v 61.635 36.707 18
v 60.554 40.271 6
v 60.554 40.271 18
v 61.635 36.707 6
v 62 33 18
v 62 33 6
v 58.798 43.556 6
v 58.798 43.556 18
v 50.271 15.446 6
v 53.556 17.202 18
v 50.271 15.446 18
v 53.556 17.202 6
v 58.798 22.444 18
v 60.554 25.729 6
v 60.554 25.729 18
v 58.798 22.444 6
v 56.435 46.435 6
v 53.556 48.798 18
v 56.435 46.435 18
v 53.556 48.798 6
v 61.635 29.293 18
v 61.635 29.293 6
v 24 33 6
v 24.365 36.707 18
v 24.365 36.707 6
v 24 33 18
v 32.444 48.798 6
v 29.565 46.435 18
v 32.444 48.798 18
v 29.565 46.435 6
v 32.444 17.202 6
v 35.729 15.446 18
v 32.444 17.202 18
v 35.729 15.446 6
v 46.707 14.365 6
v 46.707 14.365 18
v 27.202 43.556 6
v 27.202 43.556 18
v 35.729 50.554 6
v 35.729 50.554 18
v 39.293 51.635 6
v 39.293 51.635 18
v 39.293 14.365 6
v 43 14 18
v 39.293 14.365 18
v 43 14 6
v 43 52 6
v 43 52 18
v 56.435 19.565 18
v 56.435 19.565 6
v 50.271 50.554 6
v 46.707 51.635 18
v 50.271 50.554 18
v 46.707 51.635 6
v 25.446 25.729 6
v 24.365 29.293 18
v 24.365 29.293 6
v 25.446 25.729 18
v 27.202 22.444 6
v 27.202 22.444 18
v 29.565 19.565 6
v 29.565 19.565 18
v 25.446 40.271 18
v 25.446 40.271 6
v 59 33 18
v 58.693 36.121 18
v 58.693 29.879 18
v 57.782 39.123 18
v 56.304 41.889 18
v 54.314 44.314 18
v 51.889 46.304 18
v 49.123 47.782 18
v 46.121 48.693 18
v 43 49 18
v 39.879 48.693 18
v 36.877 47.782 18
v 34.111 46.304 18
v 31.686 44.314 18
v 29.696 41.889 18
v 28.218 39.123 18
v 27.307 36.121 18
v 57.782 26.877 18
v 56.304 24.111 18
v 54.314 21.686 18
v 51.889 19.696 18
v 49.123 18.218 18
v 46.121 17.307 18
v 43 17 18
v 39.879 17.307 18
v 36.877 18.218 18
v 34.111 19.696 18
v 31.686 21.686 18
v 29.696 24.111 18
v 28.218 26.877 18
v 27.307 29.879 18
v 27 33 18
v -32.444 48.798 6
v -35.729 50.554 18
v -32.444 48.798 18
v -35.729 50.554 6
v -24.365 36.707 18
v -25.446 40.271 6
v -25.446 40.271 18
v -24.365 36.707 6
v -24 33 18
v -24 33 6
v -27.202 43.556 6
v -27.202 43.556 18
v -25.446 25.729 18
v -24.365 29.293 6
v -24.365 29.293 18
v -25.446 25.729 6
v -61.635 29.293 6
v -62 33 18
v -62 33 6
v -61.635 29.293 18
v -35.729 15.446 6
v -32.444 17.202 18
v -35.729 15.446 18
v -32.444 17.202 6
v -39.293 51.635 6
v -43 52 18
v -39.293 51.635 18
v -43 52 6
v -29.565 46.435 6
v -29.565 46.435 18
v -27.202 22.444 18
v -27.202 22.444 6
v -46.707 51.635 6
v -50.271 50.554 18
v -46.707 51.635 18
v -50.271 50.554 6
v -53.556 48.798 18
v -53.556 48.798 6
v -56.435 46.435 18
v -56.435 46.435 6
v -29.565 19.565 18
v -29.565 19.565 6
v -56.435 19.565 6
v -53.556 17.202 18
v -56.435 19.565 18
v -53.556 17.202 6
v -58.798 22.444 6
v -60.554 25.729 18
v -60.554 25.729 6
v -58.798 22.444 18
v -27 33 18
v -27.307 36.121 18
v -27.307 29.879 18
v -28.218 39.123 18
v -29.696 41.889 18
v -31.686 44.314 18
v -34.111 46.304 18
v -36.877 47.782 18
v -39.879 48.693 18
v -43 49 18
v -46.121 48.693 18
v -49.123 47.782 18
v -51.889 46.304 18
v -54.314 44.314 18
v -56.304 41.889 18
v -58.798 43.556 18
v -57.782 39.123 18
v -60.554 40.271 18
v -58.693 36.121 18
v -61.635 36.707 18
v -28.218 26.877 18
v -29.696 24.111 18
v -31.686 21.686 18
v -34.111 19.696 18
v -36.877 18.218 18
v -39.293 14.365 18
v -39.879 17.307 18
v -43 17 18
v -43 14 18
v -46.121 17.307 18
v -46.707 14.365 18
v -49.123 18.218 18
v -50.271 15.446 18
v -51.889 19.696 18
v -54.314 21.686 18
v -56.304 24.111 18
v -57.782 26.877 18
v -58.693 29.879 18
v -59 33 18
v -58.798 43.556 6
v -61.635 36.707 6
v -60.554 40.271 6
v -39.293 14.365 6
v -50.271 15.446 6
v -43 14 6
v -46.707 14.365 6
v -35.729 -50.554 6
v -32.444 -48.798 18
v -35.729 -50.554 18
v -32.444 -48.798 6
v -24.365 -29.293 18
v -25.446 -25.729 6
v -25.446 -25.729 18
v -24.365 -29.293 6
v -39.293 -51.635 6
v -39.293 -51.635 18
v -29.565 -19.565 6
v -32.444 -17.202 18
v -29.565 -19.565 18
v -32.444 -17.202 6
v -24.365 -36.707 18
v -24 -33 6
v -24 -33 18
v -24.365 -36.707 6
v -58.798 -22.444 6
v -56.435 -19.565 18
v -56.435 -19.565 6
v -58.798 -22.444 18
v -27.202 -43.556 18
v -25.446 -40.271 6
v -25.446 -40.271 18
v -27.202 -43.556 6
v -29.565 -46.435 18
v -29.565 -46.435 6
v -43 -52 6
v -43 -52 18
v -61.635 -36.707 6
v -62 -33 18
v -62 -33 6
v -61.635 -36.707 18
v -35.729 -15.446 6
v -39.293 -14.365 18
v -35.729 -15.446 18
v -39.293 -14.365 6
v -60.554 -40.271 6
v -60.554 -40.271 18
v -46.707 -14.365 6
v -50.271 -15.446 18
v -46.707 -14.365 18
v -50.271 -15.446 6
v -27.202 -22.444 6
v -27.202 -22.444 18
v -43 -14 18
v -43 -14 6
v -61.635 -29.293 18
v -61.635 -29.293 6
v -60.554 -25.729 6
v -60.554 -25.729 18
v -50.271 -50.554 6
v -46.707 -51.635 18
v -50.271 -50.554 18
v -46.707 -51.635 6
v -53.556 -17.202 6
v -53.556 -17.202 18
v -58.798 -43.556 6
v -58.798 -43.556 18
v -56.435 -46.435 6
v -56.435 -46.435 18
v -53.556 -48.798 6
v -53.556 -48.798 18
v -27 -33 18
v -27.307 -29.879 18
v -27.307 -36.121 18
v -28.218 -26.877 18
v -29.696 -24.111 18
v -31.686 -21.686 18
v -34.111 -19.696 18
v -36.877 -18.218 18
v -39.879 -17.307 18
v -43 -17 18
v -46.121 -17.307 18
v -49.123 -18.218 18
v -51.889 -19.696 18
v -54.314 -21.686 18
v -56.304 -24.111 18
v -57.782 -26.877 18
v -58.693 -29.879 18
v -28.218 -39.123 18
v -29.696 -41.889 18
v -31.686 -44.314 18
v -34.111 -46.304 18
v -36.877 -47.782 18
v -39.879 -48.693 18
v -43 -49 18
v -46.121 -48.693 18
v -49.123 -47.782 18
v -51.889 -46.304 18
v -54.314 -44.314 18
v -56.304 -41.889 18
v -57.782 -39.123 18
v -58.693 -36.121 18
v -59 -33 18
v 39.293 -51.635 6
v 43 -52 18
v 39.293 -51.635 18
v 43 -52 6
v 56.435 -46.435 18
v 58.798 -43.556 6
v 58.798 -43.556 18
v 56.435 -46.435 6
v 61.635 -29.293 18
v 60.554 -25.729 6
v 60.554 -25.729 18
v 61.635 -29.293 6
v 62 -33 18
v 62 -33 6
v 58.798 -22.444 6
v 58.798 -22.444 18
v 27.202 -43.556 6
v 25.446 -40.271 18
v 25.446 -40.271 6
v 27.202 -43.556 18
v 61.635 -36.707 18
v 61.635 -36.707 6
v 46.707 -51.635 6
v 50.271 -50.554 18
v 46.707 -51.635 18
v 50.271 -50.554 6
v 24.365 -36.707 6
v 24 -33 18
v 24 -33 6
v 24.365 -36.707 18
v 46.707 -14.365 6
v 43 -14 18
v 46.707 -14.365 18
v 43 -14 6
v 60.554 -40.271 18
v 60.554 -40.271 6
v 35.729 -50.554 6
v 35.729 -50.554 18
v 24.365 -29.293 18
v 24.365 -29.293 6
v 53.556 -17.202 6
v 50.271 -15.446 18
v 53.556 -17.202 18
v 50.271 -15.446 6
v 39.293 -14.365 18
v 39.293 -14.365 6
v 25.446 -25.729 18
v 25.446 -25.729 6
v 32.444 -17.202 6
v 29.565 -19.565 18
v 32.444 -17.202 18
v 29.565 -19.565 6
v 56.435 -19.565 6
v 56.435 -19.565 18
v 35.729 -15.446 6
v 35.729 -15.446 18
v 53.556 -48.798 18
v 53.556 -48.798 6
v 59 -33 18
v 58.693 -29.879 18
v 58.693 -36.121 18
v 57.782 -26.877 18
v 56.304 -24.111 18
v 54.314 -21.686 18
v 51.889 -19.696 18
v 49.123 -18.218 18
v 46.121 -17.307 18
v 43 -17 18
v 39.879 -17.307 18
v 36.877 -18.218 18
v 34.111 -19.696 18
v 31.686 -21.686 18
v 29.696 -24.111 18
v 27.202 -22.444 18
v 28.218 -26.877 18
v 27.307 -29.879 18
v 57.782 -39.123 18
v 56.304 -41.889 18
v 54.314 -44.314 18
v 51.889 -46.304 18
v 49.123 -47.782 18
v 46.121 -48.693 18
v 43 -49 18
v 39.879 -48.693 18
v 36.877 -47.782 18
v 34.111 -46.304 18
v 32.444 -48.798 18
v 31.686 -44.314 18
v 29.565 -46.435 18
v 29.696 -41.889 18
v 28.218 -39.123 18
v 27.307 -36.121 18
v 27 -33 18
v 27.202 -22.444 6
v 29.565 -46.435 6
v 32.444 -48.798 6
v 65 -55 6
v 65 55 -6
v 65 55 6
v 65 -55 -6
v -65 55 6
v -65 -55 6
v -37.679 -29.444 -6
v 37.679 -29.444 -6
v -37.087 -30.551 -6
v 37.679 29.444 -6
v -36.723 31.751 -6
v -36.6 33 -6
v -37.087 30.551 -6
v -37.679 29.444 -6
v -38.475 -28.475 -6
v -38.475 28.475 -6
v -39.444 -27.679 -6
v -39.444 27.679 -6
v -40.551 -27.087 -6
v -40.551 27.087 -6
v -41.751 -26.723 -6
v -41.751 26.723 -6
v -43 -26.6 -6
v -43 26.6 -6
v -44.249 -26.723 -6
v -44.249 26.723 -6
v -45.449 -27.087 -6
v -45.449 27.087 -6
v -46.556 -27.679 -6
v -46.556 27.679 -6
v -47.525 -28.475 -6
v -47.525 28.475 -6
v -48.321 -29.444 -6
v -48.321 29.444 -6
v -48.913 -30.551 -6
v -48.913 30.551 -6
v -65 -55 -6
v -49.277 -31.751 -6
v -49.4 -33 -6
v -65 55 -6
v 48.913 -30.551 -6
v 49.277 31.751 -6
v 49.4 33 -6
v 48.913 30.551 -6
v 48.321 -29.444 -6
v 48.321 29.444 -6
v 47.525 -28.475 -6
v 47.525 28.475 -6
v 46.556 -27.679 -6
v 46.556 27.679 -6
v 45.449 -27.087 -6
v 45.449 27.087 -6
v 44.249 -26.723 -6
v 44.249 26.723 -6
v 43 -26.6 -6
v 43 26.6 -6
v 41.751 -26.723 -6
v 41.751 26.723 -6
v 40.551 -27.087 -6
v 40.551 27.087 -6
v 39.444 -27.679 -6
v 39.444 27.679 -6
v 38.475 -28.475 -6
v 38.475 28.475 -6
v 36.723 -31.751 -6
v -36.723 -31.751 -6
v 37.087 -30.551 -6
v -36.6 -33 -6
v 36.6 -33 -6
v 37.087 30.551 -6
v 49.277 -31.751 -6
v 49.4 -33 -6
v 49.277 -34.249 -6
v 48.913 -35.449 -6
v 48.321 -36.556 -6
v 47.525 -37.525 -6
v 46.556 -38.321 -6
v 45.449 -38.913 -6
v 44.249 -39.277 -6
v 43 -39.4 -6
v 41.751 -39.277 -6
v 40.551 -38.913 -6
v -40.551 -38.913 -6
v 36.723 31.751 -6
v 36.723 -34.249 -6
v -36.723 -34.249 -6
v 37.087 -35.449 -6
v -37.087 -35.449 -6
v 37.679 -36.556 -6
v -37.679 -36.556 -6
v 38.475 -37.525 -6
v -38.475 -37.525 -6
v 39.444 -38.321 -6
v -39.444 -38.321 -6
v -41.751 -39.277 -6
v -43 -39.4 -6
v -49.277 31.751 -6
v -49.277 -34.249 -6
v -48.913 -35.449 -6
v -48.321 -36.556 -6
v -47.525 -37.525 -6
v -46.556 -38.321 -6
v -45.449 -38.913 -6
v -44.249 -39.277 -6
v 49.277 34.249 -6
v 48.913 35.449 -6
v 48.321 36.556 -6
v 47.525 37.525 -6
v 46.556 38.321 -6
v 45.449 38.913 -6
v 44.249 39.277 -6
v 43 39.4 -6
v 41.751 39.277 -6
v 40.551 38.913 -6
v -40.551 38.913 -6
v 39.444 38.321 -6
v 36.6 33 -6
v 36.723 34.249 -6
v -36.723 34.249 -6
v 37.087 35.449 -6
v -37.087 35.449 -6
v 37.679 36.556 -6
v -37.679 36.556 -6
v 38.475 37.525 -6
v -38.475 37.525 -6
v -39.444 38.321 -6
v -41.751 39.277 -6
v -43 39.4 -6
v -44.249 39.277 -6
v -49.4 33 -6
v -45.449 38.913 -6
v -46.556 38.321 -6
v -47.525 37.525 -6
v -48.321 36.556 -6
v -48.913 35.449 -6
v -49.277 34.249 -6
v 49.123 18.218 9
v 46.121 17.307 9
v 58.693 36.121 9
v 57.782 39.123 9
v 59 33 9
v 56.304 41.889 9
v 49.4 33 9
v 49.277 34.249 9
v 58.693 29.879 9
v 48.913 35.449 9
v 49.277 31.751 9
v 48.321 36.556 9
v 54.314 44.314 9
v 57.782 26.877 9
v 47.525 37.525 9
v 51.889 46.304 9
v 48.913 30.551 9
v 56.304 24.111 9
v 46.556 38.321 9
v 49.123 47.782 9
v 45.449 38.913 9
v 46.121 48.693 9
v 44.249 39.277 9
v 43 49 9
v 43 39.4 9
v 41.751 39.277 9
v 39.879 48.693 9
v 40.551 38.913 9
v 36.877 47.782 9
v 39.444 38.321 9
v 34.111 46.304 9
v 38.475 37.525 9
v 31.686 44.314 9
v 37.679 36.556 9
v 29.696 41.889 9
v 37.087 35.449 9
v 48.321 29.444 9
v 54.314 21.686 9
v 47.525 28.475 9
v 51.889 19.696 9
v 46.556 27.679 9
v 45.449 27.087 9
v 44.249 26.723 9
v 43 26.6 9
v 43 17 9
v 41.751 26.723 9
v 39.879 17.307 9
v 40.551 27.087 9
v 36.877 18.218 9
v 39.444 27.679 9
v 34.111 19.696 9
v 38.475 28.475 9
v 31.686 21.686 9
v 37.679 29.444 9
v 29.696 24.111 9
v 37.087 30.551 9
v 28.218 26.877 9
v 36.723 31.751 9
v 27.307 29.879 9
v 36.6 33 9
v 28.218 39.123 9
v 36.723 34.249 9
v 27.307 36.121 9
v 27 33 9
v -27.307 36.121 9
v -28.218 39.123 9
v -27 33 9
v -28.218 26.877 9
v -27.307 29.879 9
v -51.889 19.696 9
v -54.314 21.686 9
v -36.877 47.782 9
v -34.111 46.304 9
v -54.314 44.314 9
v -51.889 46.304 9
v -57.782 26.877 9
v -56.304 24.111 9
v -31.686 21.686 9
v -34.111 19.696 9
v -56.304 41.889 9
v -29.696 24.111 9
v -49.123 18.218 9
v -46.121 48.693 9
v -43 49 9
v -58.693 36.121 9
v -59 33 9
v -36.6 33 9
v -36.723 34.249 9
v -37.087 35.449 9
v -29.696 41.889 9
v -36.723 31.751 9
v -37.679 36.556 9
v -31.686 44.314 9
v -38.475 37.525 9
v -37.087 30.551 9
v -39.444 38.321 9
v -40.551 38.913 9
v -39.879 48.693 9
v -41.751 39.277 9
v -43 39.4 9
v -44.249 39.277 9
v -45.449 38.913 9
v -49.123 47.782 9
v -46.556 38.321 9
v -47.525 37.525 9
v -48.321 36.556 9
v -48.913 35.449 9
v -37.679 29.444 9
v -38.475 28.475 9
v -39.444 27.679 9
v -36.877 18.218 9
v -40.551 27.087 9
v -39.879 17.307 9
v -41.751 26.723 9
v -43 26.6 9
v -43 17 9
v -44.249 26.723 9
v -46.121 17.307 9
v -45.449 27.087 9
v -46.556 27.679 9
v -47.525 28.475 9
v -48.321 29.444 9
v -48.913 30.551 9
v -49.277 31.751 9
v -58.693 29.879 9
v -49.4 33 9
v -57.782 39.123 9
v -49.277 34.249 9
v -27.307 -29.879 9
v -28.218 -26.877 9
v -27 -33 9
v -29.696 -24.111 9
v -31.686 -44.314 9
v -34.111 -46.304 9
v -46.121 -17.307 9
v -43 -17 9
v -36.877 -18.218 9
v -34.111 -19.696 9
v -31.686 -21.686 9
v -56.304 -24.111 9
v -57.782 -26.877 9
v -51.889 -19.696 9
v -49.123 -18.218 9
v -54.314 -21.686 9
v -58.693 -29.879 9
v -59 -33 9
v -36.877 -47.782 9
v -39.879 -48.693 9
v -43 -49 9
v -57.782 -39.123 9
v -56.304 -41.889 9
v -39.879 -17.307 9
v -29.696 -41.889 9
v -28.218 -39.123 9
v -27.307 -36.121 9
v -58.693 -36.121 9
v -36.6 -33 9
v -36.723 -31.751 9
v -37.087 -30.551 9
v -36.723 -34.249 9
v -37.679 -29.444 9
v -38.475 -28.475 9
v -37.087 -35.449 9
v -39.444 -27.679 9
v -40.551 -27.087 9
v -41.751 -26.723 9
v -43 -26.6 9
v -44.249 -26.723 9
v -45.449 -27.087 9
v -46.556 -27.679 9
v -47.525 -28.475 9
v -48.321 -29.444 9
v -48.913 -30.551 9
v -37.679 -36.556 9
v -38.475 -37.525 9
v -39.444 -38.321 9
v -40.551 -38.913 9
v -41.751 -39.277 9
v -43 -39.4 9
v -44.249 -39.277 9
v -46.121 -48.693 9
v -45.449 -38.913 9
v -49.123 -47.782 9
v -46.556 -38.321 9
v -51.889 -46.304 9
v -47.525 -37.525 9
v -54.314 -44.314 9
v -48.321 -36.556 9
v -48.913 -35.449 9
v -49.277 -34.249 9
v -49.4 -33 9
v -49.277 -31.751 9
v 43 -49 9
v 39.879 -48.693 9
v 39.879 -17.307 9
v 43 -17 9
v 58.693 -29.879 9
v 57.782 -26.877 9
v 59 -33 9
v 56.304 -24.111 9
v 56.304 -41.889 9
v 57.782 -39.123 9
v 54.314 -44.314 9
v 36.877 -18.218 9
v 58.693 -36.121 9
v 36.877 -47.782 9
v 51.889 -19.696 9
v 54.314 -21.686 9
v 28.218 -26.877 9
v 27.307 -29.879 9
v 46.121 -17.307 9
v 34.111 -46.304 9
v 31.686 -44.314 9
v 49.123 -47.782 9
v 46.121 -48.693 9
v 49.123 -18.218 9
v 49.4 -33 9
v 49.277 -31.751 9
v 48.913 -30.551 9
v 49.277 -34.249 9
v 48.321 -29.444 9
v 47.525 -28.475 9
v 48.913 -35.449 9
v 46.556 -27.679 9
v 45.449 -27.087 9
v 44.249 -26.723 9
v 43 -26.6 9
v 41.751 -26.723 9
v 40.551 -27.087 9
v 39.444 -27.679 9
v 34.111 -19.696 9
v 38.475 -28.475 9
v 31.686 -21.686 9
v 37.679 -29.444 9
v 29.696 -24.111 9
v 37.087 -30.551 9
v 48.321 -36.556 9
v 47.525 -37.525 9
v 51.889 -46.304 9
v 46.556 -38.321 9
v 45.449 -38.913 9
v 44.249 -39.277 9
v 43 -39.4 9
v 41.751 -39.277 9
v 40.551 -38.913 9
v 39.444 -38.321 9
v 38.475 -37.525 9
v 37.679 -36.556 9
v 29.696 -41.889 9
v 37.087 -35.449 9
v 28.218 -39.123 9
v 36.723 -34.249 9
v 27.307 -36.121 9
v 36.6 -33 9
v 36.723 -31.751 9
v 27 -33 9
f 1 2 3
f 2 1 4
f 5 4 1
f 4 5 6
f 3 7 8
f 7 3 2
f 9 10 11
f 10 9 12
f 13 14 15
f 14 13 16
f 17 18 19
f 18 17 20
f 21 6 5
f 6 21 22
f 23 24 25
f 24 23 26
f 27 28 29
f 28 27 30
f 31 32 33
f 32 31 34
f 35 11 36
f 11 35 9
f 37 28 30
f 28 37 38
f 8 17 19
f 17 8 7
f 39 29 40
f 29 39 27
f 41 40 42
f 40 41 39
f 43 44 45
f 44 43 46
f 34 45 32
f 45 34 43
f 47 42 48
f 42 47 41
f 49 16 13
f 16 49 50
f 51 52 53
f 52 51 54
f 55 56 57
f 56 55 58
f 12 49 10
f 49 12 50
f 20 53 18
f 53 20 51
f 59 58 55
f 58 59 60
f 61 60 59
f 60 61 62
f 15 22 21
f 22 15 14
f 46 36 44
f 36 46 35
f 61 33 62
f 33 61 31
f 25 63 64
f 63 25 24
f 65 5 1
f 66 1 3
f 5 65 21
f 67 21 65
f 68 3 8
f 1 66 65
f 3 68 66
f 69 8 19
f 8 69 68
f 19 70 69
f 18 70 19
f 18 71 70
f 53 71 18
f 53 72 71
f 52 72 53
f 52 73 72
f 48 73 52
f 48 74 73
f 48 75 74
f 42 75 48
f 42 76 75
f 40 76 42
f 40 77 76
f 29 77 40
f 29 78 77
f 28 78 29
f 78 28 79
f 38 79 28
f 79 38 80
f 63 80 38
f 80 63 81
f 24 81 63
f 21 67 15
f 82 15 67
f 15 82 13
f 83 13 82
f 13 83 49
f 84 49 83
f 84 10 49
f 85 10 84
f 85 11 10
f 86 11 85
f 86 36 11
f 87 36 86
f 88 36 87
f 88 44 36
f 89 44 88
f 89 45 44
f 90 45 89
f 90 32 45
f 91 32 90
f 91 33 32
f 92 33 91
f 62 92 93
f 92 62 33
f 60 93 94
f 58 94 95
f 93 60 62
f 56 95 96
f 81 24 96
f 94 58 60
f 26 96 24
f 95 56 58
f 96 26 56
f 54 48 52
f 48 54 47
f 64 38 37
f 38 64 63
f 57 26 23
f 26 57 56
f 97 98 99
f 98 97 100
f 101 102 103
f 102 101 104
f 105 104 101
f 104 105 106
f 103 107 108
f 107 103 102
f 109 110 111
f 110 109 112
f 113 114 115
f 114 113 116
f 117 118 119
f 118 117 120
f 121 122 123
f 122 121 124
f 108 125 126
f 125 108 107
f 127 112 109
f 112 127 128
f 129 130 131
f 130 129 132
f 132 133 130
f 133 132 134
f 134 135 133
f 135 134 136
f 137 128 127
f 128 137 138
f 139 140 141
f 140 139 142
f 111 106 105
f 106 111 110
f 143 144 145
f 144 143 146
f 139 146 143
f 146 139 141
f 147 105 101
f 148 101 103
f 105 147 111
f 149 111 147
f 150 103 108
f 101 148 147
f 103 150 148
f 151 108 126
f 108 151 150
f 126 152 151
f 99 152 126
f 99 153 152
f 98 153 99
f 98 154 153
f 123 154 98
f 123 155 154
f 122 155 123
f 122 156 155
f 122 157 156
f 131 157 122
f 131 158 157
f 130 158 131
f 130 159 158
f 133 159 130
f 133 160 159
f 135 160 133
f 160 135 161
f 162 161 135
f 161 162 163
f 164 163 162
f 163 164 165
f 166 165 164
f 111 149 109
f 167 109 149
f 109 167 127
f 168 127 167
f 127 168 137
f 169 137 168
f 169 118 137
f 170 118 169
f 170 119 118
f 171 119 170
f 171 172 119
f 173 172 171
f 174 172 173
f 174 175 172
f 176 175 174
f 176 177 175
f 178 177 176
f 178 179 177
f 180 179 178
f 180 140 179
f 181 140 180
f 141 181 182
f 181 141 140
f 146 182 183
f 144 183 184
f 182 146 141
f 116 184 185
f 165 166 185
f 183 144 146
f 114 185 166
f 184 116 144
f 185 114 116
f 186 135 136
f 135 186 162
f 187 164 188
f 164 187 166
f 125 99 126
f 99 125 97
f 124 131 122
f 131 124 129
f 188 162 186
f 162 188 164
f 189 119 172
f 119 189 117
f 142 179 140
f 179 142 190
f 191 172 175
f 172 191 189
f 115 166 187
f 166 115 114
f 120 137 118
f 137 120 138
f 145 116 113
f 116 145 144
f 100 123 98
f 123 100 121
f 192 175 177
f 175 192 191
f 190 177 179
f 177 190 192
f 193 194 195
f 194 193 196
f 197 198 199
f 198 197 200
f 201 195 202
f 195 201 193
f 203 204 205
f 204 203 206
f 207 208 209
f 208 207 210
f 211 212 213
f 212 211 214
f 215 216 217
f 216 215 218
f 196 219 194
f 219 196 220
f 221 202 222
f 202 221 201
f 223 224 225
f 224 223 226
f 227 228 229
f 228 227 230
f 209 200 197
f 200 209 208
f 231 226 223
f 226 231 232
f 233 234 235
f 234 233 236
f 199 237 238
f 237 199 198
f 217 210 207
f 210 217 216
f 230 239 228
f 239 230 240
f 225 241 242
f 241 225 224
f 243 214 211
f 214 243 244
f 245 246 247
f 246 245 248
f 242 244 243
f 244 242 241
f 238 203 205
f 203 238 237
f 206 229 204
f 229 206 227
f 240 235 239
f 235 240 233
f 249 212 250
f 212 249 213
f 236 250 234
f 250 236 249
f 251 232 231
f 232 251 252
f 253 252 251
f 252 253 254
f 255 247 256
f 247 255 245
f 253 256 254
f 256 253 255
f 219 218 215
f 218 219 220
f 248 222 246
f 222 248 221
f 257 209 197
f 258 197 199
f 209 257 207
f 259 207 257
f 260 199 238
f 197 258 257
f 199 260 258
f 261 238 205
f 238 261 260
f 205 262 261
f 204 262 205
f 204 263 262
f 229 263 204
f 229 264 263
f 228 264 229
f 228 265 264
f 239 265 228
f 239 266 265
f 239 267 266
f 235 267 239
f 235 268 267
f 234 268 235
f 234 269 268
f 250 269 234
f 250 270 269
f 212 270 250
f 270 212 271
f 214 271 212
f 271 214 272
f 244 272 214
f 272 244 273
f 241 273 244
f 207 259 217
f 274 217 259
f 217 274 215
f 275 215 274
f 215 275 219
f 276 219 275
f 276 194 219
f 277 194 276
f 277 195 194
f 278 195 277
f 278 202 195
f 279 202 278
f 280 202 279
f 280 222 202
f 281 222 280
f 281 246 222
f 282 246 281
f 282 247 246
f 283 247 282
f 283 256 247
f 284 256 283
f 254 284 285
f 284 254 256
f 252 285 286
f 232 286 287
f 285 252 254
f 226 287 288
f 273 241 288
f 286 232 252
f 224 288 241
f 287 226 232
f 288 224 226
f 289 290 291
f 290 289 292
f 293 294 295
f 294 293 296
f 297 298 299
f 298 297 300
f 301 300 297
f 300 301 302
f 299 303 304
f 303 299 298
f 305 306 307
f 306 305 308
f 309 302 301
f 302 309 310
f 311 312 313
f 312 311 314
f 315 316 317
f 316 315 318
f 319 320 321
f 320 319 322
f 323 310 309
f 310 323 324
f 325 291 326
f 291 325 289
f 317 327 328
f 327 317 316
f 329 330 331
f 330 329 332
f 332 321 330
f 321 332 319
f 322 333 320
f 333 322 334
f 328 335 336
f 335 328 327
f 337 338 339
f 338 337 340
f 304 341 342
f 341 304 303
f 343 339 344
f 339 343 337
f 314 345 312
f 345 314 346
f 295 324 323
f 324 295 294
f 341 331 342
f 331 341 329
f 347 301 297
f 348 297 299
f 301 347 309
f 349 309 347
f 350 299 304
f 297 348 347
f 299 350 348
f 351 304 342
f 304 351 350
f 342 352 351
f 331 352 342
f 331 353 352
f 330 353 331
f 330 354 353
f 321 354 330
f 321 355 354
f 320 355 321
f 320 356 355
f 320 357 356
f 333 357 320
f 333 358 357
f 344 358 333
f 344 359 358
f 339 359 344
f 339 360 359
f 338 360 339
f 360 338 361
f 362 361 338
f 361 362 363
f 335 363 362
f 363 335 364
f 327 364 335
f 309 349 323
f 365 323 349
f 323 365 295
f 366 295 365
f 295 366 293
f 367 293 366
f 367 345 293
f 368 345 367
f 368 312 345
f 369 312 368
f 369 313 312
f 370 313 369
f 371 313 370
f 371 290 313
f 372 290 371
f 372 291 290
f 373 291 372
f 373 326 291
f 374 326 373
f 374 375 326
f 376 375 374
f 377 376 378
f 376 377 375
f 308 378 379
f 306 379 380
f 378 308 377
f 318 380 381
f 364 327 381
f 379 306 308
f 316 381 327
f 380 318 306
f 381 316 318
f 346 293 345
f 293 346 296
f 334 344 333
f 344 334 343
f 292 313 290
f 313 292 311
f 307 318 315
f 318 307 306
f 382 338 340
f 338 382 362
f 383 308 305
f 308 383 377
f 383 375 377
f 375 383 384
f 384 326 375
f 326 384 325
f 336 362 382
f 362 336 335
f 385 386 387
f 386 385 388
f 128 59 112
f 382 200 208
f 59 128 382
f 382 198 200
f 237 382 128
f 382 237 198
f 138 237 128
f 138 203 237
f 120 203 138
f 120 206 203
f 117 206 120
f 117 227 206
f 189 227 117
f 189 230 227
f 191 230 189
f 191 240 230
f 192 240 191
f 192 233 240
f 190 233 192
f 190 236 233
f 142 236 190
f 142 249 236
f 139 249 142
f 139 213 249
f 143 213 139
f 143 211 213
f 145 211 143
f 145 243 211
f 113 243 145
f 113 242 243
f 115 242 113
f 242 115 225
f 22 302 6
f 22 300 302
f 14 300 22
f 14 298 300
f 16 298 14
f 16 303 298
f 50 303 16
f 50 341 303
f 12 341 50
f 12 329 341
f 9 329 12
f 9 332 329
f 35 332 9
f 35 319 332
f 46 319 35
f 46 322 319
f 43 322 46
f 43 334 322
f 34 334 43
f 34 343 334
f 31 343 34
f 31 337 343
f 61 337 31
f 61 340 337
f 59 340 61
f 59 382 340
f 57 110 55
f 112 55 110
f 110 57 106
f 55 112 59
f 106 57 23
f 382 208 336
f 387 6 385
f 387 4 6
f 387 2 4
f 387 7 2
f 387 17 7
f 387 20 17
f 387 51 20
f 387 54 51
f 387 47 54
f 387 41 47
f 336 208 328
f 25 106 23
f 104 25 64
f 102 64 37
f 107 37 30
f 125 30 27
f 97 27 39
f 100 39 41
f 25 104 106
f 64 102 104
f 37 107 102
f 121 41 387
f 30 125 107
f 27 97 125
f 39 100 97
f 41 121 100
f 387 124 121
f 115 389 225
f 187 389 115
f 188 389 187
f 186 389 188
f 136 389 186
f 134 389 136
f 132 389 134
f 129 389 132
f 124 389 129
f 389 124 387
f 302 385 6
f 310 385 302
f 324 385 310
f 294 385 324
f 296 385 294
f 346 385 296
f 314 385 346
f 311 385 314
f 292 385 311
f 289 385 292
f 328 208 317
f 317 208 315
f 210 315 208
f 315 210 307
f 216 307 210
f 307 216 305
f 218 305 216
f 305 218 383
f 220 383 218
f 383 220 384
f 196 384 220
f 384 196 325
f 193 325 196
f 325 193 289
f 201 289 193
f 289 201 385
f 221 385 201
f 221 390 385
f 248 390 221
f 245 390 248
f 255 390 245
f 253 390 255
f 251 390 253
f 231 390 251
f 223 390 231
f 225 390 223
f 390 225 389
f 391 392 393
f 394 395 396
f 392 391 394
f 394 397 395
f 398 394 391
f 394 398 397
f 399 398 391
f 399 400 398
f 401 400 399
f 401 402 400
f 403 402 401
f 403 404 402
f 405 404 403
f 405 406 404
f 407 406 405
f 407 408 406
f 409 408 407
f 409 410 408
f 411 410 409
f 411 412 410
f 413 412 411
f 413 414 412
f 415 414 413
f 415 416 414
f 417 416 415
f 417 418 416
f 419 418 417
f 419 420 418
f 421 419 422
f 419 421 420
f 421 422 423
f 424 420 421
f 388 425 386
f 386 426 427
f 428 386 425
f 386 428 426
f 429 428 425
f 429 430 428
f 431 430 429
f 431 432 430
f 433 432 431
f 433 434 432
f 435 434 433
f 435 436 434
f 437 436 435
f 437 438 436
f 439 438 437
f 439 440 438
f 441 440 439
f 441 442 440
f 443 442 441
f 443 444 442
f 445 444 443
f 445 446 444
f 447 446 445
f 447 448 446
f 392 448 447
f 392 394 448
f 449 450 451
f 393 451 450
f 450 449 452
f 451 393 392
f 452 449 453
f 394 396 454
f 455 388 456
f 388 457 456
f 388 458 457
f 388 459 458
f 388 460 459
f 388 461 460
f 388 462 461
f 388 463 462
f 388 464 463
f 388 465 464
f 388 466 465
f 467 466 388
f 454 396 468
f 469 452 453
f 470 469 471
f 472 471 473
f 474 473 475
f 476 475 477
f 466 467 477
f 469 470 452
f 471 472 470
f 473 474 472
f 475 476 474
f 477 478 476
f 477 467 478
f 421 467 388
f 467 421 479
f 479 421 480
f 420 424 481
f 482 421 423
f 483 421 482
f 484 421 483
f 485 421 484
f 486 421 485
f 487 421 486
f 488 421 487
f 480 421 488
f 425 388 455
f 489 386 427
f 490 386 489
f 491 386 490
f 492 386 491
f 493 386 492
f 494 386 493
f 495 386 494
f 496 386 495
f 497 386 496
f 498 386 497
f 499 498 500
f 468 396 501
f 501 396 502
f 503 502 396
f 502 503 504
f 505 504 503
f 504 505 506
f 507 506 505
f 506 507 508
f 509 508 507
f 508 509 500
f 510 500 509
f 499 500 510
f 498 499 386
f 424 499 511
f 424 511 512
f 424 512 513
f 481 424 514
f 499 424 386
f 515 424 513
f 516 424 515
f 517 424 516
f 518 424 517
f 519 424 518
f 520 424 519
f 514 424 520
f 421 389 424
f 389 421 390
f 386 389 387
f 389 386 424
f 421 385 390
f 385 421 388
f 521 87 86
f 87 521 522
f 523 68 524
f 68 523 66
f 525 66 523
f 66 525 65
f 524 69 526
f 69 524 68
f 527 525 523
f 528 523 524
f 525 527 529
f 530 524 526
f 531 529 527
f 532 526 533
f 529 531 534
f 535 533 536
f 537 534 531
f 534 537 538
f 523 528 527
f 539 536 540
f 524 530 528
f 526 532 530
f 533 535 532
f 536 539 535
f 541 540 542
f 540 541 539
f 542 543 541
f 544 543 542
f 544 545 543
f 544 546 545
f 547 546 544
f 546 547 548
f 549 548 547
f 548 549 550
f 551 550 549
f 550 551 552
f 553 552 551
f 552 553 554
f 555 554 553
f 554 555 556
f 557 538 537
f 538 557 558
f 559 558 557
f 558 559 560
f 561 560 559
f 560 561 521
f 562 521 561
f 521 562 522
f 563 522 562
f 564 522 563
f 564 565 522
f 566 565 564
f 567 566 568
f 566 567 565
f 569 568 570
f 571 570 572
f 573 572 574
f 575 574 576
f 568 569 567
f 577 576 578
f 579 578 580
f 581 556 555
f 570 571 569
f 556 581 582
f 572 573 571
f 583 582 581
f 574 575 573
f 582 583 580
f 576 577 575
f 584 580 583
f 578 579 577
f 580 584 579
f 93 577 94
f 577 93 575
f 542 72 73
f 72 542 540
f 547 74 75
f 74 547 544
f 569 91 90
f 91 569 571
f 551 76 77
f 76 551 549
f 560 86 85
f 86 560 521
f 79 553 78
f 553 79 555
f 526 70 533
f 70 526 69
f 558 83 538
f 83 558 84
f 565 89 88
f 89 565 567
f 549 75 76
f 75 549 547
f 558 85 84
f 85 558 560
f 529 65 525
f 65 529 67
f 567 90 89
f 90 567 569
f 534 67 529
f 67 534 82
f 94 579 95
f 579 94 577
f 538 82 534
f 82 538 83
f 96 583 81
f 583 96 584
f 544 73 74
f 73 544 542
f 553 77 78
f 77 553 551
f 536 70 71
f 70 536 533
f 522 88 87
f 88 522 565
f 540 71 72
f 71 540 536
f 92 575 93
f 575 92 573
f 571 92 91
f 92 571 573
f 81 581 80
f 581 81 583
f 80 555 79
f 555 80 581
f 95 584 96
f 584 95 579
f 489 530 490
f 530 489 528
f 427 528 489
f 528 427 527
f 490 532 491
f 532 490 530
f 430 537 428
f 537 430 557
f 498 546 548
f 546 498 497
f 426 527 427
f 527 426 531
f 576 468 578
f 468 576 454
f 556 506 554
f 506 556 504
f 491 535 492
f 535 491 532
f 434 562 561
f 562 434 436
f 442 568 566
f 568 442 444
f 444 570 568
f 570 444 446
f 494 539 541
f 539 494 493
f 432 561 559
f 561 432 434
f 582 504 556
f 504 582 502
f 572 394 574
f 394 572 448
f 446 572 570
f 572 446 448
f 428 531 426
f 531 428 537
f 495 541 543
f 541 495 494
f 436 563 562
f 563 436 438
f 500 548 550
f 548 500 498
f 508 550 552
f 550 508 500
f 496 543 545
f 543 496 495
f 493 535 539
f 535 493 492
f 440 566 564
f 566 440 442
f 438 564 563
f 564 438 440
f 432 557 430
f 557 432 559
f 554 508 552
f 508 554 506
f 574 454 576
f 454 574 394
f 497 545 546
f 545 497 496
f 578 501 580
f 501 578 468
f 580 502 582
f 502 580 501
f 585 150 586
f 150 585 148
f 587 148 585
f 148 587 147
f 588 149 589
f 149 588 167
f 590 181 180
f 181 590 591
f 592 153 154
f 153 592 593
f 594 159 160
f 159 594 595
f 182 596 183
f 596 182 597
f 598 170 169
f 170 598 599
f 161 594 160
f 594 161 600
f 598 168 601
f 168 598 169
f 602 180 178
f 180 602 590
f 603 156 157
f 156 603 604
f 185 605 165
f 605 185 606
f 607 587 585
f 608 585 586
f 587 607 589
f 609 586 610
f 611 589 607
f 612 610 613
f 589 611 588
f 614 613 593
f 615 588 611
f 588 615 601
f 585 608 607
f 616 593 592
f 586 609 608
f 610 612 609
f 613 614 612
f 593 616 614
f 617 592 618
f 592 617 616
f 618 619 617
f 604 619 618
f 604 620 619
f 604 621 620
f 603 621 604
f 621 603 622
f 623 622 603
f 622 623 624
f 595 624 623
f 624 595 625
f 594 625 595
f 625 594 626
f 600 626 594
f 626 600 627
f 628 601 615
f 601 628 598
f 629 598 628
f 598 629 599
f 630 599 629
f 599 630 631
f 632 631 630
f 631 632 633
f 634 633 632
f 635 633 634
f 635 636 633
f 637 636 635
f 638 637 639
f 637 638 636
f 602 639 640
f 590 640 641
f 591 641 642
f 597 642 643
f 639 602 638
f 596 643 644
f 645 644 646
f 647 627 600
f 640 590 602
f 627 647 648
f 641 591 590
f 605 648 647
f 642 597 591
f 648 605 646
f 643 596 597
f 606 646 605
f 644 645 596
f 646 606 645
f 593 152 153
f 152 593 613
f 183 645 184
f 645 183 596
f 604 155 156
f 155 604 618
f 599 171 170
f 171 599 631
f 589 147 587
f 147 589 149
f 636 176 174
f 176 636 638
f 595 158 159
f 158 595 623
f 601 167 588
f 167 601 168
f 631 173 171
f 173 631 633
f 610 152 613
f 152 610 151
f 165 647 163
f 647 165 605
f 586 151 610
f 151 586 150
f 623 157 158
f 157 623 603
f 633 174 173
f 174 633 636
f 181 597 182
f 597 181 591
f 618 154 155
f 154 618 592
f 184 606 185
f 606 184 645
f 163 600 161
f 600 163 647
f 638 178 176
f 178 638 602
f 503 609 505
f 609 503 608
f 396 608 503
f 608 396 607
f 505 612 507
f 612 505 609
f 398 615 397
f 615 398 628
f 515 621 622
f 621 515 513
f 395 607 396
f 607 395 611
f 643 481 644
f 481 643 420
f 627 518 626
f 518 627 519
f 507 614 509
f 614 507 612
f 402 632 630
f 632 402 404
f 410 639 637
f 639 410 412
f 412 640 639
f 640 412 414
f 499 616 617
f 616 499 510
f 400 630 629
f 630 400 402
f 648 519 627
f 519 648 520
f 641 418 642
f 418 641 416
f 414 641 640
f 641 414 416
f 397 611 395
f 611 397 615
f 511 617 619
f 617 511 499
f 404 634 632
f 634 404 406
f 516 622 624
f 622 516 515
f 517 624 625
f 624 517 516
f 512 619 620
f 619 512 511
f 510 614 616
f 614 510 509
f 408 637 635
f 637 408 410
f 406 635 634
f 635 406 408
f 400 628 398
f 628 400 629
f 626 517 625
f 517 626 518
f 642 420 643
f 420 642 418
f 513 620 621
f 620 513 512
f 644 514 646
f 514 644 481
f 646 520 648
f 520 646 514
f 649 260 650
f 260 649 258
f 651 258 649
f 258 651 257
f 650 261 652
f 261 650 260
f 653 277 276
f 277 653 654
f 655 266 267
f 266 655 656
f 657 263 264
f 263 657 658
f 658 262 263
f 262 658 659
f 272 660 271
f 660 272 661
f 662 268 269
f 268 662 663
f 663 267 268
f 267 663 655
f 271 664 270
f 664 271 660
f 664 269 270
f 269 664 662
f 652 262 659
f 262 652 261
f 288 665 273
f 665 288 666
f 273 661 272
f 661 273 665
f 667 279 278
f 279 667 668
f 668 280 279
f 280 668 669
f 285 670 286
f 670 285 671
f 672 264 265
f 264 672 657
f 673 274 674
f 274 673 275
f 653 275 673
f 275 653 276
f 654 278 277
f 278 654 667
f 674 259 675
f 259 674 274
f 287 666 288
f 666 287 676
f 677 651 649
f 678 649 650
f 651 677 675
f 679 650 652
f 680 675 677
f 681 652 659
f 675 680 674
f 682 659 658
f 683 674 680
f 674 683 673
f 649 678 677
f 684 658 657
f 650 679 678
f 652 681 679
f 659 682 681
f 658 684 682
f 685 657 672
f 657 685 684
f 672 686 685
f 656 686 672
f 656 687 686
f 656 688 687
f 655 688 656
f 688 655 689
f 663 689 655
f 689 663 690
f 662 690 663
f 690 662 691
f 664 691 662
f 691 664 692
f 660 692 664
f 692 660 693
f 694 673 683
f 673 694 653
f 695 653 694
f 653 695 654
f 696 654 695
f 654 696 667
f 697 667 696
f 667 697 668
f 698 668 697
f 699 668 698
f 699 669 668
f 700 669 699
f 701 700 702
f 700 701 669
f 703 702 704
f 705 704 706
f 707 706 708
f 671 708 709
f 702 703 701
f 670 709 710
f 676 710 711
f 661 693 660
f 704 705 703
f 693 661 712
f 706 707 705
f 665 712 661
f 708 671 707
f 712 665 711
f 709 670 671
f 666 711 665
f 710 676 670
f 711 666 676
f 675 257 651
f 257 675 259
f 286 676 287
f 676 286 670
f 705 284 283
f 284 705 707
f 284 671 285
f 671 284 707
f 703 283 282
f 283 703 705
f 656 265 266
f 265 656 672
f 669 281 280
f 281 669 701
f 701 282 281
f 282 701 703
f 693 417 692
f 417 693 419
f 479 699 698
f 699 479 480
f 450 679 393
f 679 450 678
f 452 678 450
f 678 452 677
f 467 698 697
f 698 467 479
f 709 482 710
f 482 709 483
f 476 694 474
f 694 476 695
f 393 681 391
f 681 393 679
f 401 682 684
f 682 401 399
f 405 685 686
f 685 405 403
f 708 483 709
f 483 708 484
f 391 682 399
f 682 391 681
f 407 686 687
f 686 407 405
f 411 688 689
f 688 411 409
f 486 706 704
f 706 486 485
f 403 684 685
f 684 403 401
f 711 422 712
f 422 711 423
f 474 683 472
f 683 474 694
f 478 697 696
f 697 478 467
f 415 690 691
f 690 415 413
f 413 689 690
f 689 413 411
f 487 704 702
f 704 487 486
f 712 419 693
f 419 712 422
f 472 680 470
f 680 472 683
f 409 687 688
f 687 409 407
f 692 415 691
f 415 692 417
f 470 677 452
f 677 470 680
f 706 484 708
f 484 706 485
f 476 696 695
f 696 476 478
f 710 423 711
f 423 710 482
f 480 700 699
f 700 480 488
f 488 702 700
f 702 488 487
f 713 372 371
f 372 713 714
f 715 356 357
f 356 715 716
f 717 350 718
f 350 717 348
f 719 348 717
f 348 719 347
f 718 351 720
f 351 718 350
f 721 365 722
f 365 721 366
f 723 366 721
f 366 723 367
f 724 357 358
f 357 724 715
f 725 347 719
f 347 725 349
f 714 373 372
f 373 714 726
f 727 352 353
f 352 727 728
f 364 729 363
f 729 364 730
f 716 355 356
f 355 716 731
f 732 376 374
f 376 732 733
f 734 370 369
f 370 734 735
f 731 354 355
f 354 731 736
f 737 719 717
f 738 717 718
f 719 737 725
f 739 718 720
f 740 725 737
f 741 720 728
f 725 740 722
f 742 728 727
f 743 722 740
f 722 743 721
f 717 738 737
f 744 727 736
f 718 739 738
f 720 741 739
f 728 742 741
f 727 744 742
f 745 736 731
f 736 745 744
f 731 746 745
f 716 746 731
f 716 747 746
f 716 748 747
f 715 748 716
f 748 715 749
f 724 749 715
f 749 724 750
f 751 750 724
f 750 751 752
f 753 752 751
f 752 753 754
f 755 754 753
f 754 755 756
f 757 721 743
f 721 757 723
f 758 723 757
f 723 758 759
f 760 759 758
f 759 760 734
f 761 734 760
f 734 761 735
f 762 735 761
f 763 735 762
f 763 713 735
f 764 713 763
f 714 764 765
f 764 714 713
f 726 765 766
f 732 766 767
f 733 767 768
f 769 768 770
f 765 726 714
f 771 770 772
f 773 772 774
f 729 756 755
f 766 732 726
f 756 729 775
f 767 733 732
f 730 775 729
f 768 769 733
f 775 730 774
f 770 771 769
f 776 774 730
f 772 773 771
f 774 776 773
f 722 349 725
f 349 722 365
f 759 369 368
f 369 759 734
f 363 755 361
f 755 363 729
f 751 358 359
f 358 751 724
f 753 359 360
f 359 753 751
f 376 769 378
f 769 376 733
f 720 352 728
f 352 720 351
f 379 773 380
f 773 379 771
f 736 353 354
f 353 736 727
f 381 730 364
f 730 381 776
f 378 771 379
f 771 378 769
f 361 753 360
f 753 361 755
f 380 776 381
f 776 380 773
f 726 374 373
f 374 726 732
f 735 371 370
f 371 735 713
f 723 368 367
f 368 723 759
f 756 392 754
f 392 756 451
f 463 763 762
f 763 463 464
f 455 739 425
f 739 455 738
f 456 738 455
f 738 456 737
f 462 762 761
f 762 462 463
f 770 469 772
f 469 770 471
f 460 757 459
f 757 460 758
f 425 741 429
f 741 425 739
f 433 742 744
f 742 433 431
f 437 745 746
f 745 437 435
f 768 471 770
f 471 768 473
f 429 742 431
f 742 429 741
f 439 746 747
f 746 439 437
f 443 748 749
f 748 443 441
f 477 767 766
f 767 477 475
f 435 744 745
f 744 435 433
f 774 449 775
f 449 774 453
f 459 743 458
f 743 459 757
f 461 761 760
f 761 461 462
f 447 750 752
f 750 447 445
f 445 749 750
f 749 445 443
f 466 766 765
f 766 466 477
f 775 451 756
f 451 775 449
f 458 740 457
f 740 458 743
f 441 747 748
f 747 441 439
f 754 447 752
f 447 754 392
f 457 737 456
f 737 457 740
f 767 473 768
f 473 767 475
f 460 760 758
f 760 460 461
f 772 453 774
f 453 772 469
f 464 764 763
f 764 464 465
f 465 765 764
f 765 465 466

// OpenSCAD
$fn = 32;

// ----------------------------------------------------------------------
// Socket pad plate
// bosses with counterbored sockets for the screws
// ----------------------------------------------------------------------

// --- parameters (mm) ---
base_t = 12;             // base plate thickness
boss_h = 12;             // boss height above the base plate
boss_d = 38;             // boss diameter
socket_d = 32;           // socket diameter
socket_depth = 9;        // socket depth from the boss face
bolt_d = 12.8;           // screw clearance hole through the socket floor
plate = [130, 110, 12];  // overall size (x, y, z)
edge = 22;               // boss centre offset from the plate edge
pads = 4;                // boss count, one per corner

// --- derived feature positions (mm) ---
height = base_t + boss_h;        // = 24   overall height of the part
corner_x = plate[0] / 2 - edge;  // = 43   boss centre X
corner_y = plate[1] / 2 - edge;  // = 33   boss centre Y
feature_centers = [
  [corner_x, corner_y],
  [-corner_x, corner_y],
  [-corner_x, -corner_y],
  [corner_x, -corner_y]
];   // boss centres: sockets, holes and the pads themselves are placed from here

// base plate, bosses on feature_centers, socket + through hole in each
difference() {
  union() {
    cube(plate, center = true);
    for (centre = feature_centers)
      translate([centre[0], centre[1], plate[2] / 2 - 1])
        cylinder(d = boss_d, h = boss_h + 1);
  }
  for (centre = feature_centers) {
    translate([centre[0], centre[1], plate[2] / 2 + boss_h - socket_depth])
      cylinder(d = socket_d, h = socket_depth + 1);
    translate([centre[0], centre[1], -height])
      cylinder(d = bolt_d, h = 2 * height + 2);  // through the socket floor
  }
}
